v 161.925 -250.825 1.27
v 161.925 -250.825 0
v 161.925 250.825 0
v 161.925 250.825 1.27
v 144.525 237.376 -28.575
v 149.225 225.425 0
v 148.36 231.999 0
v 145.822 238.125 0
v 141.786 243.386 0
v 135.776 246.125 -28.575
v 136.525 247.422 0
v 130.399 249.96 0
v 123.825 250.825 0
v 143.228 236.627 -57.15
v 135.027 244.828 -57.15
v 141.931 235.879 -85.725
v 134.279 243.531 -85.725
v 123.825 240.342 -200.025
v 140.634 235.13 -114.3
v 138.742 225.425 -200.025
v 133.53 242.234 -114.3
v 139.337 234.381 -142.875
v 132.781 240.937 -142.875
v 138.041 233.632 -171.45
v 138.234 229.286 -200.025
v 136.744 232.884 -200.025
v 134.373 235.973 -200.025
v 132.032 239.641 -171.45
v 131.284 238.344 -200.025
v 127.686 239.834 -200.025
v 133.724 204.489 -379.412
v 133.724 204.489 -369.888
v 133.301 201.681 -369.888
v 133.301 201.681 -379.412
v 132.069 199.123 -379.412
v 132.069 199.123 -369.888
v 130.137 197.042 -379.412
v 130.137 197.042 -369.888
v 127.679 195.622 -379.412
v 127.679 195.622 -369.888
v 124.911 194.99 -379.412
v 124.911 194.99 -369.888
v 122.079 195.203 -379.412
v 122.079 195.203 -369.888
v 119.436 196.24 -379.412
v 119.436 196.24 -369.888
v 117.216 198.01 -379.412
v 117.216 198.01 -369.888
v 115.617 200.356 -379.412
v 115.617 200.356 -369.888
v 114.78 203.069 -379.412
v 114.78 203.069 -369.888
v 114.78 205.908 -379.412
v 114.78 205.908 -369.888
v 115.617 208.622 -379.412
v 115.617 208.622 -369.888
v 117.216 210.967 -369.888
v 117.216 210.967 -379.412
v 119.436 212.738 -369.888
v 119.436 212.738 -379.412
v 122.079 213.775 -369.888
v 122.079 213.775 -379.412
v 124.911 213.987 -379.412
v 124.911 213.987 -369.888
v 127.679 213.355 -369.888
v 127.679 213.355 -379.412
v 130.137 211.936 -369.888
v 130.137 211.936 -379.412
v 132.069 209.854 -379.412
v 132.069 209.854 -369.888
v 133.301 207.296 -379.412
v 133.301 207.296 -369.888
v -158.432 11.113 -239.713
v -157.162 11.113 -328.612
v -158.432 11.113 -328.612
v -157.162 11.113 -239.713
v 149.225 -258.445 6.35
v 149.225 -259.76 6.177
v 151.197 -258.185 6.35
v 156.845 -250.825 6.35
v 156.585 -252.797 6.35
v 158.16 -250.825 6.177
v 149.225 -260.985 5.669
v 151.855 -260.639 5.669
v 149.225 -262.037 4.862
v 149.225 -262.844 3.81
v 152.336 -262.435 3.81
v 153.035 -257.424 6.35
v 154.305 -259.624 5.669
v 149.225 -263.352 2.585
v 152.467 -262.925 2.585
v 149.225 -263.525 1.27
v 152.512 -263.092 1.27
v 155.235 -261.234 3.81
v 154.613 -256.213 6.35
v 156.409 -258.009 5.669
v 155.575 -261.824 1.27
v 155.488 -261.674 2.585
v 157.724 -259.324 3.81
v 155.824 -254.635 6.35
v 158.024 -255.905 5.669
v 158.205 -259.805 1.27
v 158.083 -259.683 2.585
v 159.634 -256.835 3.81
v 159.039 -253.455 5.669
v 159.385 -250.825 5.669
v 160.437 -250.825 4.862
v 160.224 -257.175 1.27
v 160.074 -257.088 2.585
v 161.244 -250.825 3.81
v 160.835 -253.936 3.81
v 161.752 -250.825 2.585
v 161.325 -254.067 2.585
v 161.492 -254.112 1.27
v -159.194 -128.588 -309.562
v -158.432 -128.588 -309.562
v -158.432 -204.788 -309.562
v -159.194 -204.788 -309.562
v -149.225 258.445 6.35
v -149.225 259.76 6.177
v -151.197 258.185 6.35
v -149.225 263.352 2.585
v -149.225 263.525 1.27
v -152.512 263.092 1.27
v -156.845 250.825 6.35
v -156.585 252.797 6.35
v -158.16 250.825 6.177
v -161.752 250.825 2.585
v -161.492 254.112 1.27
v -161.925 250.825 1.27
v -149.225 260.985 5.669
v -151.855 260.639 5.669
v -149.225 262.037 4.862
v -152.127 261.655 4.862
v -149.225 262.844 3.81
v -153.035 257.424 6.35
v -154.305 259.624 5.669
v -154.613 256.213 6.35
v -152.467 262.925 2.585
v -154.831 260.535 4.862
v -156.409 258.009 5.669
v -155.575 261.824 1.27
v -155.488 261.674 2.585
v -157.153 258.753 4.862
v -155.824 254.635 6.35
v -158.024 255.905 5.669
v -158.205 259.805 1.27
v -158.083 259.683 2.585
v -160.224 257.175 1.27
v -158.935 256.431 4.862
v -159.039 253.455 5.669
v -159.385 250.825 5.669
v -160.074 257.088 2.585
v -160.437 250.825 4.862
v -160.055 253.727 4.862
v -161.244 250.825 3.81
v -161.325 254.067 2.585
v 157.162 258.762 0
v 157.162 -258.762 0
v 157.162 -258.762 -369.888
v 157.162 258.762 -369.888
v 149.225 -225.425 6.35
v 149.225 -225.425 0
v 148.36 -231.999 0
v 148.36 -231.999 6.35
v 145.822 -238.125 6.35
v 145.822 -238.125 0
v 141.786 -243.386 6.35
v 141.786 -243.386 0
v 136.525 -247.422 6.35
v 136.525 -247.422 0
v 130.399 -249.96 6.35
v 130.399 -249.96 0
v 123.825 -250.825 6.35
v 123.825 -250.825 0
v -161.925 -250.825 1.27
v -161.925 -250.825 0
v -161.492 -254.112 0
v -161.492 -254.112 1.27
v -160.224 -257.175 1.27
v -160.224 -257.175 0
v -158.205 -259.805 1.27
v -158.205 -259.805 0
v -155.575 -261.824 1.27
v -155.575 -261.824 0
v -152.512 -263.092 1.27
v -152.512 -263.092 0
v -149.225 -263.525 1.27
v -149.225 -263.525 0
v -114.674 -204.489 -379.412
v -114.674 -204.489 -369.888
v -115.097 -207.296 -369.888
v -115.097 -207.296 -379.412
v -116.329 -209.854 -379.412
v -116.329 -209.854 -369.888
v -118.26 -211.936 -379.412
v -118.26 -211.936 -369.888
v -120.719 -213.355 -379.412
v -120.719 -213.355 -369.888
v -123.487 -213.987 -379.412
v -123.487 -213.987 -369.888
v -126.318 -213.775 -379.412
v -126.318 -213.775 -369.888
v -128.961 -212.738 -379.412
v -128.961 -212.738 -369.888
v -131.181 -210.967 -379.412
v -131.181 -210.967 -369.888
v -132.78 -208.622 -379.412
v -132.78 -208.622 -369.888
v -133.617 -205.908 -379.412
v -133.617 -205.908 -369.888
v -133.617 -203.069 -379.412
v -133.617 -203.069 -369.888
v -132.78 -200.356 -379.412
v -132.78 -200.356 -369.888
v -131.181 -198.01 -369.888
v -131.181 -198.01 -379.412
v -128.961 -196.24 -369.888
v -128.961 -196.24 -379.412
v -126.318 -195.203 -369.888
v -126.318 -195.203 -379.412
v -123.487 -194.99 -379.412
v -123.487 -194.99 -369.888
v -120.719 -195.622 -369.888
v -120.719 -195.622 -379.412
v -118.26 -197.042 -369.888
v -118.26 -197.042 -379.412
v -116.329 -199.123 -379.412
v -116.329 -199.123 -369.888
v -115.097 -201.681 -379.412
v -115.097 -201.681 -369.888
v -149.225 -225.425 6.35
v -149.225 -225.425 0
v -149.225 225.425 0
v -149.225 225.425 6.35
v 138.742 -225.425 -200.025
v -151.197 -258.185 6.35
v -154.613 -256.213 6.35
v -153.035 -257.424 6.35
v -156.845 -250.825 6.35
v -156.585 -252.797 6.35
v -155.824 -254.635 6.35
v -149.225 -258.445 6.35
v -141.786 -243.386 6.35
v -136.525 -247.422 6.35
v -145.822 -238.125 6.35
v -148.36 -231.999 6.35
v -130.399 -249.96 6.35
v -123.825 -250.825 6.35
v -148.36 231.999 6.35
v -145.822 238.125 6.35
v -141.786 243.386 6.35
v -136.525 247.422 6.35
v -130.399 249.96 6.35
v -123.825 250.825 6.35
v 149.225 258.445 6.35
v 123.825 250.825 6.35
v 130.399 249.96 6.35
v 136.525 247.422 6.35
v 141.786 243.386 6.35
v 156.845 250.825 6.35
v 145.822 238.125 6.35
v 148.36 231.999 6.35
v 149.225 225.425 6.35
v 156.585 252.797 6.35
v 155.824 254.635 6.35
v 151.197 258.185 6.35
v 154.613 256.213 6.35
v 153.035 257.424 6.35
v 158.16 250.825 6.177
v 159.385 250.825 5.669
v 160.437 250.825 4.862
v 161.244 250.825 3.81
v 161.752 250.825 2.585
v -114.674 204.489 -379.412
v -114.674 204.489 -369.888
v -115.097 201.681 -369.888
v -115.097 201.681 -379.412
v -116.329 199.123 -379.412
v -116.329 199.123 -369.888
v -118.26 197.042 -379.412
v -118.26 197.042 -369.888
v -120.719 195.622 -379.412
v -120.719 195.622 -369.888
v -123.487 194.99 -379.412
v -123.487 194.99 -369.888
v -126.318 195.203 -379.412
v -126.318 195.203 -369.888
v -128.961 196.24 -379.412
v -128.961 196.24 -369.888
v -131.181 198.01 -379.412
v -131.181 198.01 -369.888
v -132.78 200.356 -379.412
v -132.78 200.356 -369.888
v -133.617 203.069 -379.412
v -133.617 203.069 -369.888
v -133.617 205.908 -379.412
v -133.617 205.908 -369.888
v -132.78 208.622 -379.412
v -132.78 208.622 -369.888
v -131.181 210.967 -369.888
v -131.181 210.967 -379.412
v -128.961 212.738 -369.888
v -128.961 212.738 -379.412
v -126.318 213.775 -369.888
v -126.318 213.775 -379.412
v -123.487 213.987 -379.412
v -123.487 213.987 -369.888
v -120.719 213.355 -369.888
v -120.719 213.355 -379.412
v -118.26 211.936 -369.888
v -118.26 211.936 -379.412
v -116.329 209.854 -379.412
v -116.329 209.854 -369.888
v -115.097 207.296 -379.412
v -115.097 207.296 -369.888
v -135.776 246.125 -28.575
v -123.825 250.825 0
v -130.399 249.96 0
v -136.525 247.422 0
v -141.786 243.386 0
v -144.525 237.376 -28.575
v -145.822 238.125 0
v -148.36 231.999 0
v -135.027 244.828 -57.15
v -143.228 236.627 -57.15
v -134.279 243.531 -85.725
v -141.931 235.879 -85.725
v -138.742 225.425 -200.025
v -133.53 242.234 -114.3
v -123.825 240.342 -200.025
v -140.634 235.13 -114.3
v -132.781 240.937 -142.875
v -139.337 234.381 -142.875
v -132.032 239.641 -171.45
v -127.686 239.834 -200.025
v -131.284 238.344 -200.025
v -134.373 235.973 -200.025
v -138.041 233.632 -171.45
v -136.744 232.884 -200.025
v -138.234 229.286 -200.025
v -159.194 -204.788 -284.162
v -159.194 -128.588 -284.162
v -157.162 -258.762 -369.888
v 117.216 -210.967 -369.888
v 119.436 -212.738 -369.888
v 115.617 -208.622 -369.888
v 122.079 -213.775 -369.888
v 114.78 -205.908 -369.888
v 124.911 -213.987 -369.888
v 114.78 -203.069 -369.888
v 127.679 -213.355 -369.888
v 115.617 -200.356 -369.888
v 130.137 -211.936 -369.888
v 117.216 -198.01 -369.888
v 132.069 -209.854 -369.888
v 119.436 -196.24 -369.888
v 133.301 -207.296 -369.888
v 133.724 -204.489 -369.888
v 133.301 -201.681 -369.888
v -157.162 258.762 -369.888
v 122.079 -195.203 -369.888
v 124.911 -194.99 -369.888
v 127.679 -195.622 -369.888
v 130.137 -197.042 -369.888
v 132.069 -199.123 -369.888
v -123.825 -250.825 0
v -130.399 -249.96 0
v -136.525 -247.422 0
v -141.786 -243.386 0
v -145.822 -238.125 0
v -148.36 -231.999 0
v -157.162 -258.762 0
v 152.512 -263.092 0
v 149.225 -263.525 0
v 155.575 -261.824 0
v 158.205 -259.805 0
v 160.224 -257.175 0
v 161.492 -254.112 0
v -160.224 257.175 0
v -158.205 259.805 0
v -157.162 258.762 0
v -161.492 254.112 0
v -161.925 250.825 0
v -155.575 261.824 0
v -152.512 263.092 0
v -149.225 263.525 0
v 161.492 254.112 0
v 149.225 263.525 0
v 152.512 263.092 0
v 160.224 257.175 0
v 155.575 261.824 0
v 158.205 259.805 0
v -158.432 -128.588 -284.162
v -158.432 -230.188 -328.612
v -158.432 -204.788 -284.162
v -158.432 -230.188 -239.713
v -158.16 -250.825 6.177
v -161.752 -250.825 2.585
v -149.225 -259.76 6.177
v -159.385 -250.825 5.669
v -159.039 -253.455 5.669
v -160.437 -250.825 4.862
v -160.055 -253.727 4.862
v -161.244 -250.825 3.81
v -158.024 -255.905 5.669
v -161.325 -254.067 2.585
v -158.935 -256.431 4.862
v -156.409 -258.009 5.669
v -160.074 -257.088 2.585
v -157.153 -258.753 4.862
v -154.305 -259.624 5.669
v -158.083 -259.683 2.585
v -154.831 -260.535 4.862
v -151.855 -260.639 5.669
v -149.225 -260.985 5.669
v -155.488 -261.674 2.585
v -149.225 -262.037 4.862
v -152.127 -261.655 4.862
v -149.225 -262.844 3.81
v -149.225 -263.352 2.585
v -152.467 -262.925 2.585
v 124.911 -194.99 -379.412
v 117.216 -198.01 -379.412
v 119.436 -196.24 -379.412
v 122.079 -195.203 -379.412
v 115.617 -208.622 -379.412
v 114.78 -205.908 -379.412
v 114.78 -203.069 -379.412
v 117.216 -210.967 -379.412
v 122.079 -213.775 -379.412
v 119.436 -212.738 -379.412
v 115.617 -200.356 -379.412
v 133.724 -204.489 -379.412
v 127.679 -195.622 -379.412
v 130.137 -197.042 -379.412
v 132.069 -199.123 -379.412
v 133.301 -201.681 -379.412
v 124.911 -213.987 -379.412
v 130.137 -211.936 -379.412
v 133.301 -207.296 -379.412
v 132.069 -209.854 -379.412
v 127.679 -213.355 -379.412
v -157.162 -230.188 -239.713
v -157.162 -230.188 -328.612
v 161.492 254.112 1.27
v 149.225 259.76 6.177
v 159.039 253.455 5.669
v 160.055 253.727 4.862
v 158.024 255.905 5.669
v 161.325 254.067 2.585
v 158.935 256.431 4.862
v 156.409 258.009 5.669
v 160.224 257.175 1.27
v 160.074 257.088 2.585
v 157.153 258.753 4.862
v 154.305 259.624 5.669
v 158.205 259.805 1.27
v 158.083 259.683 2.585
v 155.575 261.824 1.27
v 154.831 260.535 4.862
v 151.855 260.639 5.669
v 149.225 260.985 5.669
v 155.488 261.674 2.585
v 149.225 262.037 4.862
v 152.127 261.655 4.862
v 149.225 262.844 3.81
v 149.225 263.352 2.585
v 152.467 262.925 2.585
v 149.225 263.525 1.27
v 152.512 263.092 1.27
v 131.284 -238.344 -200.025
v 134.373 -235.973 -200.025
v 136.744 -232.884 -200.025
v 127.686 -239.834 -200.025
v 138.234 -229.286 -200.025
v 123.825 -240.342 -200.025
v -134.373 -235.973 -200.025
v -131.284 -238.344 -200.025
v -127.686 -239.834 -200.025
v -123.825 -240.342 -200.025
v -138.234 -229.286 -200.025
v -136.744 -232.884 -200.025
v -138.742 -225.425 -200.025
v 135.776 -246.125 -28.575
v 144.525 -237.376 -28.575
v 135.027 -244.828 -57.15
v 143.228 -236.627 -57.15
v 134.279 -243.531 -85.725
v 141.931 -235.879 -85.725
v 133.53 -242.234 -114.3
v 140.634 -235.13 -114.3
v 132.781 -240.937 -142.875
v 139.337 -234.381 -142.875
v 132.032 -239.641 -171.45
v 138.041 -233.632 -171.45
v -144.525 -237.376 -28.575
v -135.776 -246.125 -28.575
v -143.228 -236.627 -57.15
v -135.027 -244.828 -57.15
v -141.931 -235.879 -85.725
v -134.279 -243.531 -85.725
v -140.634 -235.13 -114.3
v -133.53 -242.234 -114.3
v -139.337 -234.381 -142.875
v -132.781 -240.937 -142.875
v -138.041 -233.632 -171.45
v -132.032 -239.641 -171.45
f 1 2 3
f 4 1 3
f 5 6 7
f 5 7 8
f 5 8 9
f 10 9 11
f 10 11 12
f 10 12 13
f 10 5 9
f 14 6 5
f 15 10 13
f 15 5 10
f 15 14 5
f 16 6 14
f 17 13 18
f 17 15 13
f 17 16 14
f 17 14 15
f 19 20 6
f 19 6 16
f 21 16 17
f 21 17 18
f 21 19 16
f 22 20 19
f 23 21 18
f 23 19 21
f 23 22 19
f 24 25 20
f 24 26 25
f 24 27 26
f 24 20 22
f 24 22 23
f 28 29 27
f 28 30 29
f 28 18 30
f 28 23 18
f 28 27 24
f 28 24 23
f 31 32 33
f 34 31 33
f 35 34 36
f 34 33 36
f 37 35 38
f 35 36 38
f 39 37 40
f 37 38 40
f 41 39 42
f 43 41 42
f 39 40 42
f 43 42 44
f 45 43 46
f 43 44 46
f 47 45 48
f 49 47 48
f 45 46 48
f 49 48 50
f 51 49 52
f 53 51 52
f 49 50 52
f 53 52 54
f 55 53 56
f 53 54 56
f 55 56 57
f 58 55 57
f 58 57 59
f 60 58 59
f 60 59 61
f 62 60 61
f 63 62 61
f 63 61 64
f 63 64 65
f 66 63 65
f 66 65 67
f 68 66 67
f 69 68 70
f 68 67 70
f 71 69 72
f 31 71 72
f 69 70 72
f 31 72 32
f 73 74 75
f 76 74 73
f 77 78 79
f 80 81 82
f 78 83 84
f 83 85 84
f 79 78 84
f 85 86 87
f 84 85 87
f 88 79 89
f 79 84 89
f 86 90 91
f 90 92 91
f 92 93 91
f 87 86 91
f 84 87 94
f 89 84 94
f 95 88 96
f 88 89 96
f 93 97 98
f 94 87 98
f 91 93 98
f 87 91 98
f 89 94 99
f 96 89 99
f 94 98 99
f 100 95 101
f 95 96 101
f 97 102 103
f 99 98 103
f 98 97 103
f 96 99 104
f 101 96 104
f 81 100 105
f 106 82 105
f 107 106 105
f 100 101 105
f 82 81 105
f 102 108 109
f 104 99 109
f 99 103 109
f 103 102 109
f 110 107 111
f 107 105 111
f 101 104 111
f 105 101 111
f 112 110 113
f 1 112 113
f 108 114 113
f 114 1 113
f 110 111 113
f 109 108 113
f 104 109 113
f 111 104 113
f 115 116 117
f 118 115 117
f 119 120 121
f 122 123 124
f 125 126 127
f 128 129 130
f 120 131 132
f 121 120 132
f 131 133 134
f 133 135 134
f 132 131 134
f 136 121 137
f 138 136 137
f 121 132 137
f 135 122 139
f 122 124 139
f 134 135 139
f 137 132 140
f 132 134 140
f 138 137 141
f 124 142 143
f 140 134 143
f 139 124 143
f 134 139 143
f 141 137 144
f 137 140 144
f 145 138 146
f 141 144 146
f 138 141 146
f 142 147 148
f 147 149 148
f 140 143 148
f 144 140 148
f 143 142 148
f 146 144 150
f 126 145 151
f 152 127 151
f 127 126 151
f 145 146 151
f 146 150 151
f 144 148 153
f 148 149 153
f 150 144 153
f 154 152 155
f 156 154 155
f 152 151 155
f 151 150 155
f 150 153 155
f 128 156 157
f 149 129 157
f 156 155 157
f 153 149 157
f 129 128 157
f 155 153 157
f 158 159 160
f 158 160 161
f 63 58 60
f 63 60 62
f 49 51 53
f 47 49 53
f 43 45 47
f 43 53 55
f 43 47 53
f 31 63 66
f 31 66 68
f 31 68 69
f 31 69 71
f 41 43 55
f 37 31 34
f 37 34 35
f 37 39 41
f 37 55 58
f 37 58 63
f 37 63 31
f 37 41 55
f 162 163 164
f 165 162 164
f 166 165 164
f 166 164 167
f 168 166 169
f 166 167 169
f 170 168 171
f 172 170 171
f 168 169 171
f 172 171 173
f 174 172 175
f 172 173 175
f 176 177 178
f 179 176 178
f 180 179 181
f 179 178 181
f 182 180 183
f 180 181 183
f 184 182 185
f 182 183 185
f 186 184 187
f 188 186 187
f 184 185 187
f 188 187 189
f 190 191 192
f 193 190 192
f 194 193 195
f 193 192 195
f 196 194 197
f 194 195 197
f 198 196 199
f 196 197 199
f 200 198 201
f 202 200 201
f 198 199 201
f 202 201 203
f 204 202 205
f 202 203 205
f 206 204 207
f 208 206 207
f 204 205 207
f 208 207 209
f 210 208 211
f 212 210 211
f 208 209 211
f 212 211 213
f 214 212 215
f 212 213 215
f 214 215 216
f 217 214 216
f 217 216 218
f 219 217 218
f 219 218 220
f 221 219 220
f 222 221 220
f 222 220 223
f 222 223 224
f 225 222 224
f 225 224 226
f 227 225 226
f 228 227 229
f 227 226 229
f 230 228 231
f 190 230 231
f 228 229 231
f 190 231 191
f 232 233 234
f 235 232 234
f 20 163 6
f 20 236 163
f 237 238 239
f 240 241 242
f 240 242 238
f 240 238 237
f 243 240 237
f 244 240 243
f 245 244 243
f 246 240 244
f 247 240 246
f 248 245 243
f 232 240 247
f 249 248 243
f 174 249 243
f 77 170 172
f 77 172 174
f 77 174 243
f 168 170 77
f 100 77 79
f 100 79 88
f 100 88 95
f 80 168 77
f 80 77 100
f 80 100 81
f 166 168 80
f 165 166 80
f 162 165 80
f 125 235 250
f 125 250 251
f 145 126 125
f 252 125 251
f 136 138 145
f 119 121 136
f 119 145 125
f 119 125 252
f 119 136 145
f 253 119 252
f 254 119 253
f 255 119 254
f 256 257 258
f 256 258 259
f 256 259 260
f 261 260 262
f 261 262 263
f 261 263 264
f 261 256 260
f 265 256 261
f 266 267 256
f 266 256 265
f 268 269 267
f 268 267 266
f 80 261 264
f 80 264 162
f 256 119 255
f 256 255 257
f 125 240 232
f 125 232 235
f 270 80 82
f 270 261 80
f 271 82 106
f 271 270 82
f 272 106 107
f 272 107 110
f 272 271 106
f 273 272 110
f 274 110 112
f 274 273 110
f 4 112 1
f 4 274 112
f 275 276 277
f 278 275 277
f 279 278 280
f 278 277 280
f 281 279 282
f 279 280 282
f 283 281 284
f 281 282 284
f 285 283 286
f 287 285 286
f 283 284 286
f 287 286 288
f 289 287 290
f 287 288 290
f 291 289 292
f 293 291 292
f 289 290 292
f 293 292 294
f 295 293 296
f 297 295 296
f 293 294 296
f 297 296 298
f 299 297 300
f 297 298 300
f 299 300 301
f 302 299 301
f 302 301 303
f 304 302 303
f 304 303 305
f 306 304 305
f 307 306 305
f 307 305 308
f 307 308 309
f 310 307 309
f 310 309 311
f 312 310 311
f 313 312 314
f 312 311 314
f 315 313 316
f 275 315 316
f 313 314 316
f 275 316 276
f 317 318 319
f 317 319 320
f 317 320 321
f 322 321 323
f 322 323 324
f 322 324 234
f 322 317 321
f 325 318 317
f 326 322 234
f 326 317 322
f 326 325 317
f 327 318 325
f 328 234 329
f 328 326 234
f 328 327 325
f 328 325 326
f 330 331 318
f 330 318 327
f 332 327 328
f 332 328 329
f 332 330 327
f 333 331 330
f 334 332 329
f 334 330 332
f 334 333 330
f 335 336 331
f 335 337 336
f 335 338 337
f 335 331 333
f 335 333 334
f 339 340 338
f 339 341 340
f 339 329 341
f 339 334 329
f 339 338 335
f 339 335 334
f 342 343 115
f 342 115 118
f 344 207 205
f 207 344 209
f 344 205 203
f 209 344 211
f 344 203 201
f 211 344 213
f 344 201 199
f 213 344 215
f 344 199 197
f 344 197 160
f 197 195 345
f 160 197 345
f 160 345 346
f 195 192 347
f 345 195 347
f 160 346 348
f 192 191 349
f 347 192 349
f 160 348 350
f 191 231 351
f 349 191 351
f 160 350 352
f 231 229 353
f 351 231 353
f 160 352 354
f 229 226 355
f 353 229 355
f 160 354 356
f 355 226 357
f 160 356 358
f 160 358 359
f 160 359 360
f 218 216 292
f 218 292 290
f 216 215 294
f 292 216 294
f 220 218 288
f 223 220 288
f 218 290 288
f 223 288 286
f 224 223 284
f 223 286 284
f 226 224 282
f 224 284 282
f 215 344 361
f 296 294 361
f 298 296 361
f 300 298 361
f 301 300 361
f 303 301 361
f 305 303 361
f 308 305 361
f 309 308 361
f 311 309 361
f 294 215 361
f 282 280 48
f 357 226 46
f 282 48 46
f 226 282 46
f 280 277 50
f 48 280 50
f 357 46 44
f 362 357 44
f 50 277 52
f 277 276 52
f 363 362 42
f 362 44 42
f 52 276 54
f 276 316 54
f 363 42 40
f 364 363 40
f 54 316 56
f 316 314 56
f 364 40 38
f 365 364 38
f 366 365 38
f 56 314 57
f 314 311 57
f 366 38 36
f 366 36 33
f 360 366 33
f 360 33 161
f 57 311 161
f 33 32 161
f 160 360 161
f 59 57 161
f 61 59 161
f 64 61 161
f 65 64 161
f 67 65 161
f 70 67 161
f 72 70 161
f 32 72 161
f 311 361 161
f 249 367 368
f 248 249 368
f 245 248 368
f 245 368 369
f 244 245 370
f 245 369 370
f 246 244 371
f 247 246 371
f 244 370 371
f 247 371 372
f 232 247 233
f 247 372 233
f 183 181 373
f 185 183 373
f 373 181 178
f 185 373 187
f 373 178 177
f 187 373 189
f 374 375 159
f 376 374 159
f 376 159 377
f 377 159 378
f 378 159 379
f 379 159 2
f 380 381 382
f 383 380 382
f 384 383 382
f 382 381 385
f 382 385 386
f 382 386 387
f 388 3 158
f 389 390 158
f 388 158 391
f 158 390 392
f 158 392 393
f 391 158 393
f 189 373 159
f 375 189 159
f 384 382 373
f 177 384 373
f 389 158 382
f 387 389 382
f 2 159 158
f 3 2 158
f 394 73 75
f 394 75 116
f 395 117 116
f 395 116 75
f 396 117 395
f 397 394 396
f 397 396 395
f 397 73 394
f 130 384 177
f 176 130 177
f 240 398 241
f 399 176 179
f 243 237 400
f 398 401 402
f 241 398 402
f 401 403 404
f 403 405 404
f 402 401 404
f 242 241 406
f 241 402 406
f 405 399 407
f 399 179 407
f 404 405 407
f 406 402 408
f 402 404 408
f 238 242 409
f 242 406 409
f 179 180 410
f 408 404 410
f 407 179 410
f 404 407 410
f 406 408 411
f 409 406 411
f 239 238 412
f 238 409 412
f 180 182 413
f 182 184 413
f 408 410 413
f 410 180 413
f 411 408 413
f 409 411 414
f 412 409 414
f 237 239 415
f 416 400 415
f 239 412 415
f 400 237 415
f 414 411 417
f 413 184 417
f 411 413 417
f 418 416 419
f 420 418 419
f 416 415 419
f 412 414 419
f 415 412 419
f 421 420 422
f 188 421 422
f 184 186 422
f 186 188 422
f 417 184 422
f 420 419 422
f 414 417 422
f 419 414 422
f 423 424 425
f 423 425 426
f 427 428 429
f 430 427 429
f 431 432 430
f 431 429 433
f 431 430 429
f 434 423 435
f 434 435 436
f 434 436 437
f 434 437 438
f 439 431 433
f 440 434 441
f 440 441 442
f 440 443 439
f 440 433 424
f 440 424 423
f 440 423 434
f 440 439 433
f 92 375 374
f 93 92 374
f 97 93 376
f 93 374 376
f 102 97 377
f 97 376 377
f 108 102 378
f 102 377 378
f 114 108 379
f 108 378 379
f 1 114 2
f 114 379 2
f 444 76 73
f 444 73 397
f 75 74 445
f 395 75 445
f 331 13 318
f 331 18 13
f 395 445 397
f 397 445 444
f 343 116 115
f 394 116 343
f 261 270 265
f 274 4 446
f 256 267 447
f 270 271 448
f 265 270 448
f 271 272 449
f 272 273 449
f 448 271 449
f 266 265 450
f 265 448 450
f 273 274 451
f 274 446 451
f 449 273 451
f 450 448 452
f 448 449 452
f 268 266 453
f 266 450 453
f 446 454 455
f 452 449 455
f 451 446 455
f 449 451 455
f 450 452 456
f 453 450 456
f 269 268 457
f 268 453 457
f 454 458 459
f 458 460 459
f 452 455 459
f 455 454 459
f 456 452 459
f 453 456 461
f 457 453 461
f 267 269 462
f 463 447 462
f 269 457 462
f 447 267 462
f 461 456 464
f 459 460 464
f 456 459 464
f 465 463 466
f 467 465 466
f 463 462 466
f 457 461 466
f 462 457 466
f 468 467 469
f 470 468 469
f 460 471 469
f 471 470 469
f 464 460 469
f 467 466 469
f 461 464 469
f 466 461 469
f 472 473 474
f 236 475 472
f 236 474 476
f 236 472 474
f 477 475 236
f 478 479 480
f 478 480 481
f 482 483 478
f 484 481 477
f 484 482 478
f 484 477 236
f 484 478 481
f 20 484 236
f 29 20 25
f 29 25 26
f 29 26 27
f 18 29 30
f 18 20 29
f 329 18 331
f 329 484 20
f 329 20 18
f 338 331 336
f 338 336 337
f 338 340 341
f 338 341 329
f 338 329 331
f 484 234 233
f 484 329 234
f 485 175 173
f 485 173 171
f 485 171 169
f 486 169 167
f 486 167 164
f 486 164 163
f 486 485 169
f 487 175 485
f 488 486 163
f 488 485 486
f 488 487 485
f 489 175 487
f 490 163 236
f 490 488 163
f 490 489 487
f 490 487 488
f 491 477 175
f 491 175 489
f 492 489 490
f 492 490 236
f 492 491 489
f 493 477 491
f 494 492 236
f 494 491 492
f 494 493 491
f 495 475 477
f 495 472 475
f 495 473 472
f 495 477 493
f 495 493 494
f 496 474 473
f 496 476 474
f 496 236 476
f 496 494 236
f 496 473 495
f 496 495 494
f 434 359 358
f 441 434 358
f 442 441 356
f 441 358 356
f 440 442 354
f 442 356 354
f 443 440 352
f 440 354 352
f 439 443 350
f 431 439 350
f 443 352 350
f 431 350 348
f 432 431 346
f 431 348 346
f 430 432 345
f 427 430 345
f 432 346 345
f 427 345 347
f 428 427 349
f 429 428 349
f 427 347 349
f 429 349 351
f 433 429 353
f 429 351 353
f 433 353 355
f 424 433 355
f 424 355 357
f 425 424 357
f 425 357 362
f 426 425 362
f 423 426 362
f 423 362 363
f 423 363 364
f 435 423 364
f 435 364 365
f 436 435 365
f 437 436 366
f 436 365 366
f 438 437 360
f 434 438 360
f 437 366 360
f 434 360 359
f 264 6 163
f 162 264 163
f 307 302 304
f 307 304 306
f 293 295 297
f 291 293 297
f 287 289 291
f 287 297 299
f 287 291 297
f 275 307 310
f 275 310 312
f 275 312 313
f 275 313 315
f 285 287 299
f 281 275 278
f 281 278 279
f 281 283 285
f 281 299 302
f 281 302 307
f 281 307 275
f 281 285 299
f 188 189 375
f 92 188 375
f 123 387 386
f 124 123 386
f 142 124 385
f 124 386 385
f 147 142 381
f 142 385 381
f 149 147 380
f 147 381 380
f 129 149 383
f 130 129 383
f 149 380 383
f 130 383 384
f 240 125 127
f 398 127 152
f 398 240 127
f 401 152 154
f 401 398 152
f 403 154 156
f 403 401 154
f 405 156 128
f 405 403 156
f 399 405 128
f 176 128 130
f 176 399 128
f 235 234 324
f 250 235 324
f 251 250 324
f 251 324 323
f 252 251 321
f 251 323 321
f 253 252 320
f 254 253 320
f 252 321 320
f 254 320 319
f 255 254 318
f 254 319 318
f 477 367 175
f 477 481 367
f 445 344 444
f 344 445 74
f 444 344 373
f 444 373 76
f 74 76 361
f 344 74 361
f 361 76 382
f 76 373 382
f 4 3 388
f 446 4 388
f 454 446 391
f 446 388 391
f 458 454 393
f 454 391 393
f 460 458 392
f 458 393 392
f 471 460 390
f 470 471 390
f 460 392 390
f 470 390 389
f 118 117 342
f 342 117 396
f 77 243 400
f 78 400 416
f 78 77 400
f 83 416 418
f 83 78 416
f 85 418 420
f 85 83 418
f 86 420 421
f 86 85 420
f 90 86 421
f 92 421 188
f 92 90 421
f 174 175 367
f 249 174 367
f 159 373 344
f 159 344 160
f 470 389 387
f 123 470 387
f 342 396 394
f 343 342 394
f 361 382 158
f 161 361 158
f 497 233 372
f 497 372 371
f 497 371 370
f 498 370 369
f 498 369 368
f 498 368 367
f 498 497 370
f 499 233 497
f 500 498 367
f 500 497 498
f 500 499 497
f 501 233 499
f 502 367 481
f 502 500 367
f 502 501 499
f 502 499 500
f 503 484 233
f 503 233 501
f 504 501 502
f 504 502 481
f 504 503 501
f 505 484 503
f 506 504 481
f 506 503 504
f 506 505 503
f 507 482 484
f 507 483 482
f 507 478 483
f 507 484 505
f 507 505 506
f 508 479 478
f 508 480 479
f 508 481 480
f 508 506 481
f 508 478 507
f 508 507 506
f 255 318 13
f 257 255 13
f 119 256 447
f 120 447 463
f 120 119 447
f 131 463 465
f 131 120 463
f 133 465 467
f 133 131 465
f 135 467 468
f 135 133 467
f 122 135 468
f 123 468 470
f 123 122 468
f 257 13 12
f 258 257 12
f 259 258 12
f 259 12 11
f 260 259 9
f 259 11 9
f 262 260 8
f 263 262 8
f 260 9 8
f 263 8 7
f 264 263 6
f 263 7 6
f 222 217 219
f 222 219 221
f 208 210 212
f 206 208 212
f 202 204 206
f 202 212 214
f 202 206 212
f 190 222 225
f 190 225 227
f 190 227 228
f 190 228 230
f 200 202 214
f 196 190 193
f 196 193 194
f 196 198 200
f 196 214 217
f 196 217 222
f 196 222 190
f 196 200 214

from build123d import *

# Parameters (mm, degrees)
F0_W      = 314.325
F0_H      = 517.525
F1_DEPTH  = 369.8875
F3_DEPTH  = 200.025
F3_TAPER  = 3
F4_R      = 9.525
F5_DEPTH  = 9.525
F7_DEPTH  = 6.35
F8_R      = 5.08
F9_W      = 241.3
F9_H      = 88.9
F10_DEPTH = 1.27
F11_W     = 25.4
F11_H     = 25.4
F11_W_2   = 12.7
F12_DEPTH = 0.762


with BuildPart() as f1:
    # F0 (on Top) → F1 (new body)
    with BuildSketch(Plane.XY):
        Rectangle(F0_W, F0_H)
    extrude(amount=-F1_DEPTH)

    # F2 (on face) → F3 (cut)
    with BuildSketch(Plane.XY):
        with BuildLine():
            Line((123.825, 250.825), (-123.825, 250.825))
            ThreePointArc((-123.825, 250.825), (-141.7855122421, 243.3855122421), (-149.225, 225.425))
            Line((-149.225, 225.425), (-149.225, -225.425))
            ThreePointArc((-149.225, -225.425), (-141.7855122421, -243.3855122421), (-123.825, -250.825))
            Line((-123.825, -250.825), (123.825, -250.825))
            ThreePointArc((123.825, -250.825), (141.7855122421, -243.3855122421), (149.225, -225.425))
            Line((149.225, -225.425), (149.225, 225.425))
            ThreePointArc((149.225, 225.425), (141.7855122421, 243.3855122421), (123.825, 250.825))
        make_face()
    extrude(amount=-F3_DEPTH, taper=F3_TAPER, mode=Mode.SUBTRACT)

    # F4 (on face) → F5 (join)
    with BuildSketch(Plane(origin=(0, 0, -369.8875), x_dir=(1, 0, 0), z_dir=(0, 0, -1))):
        with Locations((-124.1987000862, 204.4887688288)):
            Circle(F4_R)
        with Locations((124.1987000862, 204.4887688288)):
            Circle(F4_R)
        with Locations((124.1987000862, -204.4887688288)):
            Circle(F4_R)
        with Locations((-124.1987000862, -204.4887688288)):
            Circle(F4_R)
    extrude(amount=F5_DEPTH)

    # F6 (on face) → F7 (join)
    with BuildSketch(Plane.XY):
        with BuildLine():
            Line((149.225, 263.525), (-149.225, 263.525))
            ThreePointArc((-149.225, 263.525), (-158.2052561211, 259.8052561211), (-161.925, 250.825))
            Line((-161.925, 250.825), (-161.925, -250.825))
            ThreePointArc((-161.925, -250.825), (-158.2052561211, -259.8052561211), (-149.225, -263.525))
            Line((-149.225, -263.525), (149.225, -263.525))
            ThreePointArc((149.225, -263.525), (158.2052561211, -259.8052561211), (161.925, -250.825))
            Line((161.925, -250.825), (161.925, 250.825))
            ThreePointArc((161.925, 250.825), (158.2052561211, 259.8052561211), (149.225, 263.525))
        make_face()
        with BuildLine():
            ThreePointArc((-149.225, 225.425), (-141.7855122421, 243.3855122421), (-123.825, 250.825))
            Line((-123.825, 250.825), (123.825, 250.825))
            ThreePointArc((123.825, 250.825), (141.7855122421, 243.3855122421), (149.225, 225.425))
            Line((149.225, 225.425), (149.225, -225.425))
            ThreePointArc((149.225, -225.425), (141.7855122421, -243.3855122421), (123.825, -250.825))
            Line((123.825, -250.825), (-123.825, -250.825))
            ThreePointArc((-123.825, -250.825), (-141.7855122421, -243.3855122421), (-149.225, -225.425))
            Line((-149.225, -225.425), (-149.225, 225.425))
        make_face(mode=Mode.SUBTRACT)
    extrude(amount=F7_DEPTH)

    # F8
    f8_edges = [f1.edges().sort_by_distance(p)[0] for p in [
        (161.925, 0, 6.35),
    ]]
    fillet(f8_edges, radius=F8_R)

    # F9 (on face) → F10 (join)
    with BuildSketch(Plane(origin=(-157.1625, 0, 0), x_dir=(0, -1, 0), z_dir=(-1, 0, 0))):
        with Locations((109.5375, -284.1625)):
            Rectangle(F9_W, F9_H)
    extrude(amount=F10_DEPTH)

    # F11 (on face) → F12 (join)
    with BuildSketch(Plane(origin=(-158.4325, 0, 0), x_dir=(0, -1, 0), z_dir=(-1, 0, 0))):
        with Locations((141.2875, -296.8625)):
            Rectangle(F11_W, F11_H)
        with Locations((160.3375, -296.8625)):
            Rectangle(F11_W_2, F11_H)
        with Locations((173.0375, -296.8625)):
            Rectangle(F11_W_2, F11_H)
        with Locations((192.0875, -296.8625)):
            Rectangle(F11_W, F11_H)
    extrude(amount=F12_DEPTH)


solid = f1.part
